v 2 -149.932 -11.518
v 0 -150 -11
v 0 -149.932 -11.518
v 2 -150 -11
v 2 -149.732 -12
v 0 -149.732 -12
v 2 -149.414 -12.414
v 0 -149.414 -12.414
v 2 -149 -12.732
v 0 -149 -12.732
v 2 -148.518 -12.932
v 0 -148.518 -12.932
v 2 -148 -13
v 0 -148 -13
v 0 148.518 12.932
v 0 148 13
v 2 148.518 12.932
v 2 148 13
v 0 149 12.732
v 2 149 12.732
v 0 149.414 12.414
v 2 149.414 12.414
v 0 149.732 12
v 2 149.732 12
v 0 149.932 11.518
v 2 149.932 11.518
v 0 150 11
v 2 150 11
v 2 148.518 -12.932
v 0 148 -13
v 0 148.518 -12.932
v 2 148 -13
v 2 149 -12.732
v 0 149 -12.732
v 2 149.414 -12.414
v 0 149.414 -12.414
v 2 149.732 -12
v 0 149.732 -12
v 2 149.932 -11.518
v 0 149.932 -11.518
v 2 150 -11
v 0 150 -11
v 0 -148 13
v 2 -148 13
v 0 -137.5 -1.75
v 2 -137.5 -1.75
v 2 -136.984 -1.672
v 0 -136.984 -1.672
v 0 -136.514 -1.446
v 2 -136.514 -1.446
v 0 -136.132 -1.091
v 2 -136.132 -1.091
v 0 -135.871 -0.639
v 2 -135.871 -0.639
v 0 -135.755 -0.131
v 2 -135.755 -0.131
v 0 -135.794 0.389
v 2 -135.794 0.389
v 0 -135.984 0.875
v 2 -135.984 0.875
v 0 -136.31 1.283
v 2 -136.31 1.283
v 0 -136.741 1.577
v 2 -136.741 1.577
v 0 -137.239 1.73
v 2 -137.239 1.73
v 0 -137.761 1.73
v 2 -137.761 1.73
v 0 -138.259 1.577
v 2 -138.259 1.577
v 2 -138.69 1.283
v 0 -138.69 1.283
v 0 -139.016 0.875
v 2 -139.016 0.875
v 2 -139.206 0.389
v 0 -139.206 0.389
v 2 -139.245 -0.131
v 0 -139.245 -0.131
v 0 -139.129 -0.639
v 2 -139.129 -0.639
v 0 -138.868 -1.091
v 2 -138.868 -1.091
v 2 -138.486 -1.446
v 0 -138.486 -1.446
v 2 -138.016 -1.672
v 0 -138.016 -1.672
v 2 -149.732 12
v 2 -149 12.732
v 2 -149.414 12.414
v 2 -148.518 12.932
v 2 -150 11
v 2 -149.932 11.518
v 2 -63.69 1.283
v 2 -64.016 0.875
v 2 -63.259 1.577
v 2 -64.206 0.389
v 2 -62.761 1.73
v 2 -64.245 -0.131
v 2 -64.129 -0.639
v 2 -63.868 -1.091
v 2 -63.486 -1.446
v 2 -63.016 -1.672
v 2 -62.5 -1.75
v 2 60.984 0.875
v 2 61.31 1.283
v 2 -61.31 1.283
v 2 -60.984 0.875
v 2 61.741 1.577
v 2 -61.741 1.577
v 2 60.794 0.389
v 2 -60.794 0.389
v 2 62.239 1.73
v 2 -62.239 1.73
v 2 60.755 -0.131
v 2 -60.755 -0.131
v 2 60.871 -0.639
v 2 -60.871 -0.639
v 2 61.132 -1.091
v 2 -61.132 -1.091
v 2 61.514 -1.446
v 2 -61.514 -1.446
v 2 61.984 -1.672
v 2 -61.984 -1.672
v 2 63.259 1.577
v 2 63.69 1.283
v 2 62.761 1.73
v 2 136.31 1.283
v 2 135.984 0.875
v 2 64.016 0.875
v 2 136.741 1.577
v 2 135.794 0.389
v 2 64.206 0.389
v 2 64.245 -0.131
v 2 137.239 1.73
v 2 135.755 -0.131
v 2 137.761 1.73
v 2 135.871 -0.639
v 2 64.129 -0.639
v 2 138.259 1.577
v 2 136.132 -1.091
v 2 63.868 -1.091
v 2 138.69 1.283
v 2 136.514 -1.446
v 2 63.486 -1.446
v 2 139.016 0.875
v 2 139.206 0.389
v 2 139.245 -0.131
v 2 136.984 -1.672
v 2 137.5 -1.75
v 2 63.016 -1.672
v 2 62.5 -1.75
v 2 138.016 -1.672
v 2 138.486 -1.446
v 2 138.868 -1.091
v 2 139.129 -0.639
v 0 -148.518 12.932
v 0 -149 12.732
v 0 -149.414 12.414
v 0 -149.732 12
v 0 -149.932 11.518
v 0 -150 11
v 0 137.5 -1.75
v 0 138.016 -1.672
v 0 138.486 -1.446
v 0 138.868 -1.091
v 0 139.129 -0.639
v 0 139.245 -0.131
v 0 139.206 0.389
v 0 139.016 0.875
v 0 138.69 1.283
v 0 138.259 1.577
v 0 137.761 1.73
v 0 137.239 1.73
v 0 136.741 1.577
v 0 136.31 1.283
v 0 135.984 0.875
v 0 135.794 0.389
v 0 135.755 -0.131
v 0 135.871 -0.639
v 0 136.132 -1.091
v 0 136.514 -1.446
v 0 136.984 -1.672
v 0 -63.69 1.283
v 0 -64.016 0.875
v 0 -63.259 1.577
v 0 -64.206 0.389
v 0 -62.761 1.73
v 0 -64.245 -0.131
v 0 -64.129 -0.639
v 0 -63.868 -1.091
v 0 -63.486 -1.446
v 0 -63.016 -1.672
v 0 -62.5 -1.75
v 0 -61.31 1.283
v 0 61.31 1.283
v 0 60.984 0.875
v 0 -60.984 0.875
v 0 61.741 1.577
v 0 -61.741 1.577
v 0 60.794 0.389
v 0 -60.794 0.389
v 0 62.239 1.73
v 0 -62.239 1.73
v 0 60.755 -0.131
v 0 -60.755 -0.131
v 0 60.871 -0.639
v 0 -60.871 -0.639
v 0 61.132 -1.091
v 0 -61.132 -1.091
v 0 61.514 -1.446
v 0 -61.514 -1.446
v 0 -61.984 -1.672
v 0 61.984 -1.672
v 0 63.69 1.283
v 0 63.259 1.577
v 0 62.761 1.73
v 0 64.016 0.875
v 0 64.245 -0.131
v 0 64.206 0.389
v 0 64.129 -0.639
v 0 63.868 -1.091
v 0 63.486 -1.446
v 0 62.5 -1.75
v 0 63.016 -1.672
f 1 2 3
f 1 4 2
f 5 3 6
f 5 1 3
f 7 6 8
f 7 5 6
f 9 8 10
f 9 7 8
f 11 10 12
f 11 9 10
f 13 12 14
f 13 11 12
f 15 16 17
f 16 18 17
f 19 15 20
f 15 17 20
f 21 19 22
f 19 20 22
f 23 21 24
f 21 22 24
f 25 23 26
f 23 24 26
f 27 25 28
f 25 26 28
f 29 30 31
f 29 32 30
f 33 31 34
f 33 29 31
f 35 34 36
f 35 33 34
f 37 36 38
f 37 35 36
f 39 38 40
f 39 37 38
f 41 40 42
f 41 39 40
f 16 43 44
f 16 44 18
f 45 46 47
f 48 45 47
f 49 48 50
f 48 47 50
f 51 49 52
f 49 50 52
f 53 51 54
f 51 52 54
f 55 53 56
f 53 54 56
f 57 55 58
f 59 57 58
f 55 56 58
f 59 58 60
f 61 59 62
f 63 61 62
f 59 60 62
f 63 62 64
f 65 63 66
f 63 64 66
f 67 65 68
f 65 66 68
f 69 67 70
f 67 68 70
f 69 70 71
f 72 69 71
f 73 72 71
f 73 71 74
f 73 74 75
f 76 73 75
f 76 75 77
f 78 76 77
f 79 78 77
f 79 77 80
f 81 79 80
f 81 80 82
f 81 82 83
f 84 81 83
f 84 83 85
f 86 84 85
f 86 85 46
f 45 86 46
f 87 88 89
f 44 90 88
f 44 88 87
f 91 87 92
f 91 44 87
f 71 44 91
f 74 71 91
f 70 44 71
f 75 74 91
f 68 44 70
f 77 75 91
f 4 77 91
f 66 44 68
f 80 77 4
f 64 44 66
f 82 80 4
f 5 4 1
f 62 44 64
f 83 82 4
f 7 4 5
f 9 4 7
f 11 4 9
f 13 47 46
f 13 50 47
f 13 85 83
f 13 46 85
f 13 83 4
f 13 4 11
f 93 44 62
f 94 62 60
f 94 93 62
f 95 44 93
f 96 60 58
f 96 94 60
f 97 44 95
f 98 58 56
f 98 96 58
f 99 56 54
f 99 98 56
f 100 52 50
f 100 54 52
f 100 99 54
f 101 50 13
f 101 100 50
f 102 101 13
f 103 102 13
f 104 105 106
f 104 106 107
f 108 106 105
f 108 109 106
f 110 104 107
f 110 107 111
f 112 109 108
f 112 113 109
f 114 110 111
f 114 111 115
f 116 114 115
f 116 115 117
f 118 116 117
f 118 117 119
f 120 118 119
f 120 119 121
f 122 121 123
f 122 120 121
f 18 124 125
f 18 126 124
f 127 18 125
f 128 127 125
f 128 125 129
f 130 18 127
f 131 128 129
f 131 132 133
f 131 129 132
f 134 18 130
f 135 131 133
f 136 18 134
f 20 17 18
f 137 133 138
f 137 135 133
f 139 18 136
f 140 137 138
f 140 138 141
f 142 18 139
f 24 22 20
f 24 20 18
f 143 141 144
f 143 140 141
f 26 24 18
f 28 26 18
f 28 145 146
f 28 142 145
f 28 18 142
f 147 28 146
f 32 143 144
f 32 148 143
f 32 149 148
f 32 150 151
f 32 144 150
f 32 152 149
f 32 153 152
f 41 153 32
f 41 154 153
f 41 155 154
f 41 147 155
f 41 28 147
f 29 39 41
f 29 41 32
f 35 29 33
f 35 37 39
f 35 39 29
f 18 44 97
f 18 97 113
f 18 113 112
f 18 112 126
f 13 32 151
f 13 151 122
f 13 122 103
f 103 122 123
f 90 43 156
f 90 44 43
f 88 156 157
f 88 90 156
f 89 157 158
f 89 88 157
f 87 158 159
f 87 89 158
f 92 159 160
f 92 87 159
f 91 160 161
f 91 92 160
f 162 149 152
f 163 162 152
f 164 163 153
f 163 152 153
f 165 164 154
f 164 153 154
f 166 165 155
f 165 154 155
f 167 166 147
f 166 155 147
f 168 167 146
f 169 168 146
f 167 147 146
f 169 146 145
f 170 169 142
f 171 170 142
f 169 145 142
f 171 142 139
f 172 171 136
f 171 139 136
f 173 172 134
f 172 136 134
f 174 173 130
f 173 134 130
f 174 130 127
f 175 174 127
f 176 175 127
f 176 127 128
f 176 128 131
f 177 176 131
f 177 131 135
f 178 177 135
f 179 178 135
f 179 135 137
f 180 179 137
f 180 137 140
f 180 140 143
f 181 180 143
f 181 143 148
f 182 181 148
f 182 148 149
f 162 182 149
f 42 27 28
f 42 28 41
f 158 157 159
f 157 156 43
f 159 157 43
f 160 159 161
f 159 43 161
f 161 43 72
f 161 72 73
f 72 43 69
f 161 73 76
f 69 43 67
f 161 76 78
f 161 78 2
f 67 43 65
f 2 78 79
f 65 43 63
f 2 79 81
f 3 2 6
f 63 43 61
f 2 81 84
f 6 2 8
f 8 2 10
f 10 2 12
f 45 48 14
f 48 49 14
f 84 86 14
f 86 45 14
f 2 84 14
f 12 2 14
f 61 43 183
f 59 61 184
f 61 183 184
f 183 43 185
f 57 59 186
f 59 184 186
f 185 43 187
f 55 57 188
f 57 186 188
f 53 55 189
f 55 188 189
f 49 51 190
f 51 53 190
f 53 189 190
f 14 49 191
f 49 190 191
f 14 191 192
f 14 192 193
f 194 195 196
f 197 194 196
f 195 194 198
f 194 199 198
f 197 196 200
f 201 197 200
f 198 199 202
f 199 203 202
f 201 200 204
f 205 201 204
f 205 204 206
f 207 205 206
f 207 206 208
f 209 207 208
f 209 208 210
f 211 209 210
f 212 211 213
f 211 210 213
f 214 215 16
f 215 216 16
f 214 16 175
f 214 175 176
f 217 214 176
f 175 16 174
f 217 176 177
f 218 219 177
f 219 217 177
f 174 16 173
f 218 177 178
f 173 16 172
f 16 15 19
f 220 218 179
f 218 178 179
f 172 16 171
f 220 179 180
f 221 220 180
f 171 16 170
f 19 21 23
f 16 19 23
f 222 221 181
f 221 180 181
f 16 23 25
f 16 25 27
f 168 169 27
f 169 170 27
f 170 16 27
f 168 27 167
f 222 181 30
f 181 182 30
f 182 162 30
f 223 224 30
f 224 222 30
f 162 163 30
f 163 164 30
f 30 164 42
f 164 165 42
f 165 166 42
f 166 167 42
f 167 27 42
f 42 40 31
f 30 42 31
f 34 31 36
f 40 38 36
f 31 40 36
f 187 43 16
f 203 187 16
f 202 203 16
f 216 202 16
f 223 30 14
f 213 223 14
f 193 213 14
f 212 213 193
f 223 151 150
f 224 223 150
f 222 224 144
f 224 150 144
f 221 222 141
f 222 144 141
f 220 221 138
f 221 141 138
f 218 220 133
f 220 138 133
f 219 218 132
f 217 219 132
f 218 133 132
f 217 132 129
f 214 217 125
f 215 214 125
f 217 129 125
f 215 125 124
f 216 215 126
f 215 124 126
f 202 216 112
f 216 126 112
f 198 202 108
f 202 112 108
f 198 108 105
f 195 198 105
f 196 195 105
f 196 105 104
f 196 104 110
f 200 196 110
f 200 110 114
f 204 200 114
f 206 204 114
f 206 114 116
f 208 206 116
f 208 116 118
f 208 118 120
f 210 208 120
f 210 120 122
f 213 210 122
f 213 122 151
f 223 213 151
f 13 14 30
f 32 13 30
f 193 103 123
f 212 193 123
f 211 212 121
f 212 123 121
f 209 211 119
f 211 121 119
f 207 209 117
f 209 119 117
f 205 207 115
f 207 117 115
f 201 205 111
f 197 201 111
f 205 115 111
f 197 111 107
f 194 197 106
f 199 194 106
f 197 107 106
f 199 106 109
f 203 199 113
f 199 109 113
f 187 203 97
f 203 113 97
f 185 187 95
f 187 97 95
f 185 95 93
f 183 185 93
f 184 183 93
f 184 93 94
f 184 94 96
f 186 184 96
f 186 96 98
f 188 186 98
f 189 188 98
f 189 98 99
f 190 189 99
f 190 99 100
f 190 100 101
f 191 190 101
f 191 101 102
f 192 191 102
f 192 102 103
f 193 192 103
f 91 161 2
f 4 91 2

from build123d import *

# Parameters (mm, degrees)
SKETCH1_W           = 26
SKETCH1_H           = 300
BOSS_EXTRUDE1_DEPTH = 2
FILLET1_R           = 2
SKETCH2_R           = 1.75
CUT_EXTRUDE1_DEPTH  = 151.575562426


with BuildPart() as part:
    # Sketch1 → Boss-Extrude1 (new body)
    with BuildSketch(Plane(origin=(0, 0, 0), x_dir=(0, 0, -1), z_dir=(1, 0, 0))):
        Rectangle(SKETCH1_W, SKETCH1_H)
    extrude(amount=BOSS_EXTRUDE1_DEPTH)

    # Fillet1
    fillet1_edges = [part.edges().sort_by_distance(p)[0] for p in [
        (1, -150, -13),
        (1, -150, 13),
        (1, 150, 13),
        (1, 150, -13),
    ]]
    fillet(fillet1_edges, radius=FILLET1_R)

    # Sketch2 → Cut-Extrude1 (cut, through all)
    with BuildSketch(Plane(origin=(2, 0, 0), x_dir=(0, 0, -1), z_dir=(1, 0, 0))):
        with Locations((0, -137.5)):
            Circle(SKETCH2_R)
        with Locations((0, -62.5)):
            Circle(SKETCH2_R)
        with Locations((0, 62.5)):
            Circle(SKETCH2_R)
        with Locations((0, 137.5)):
            Circle(SKETCH2_R)
    extrude(amount=-CUT_EXTRUDE1_DEPTH, mode=Mode.SUBTRACT)


solid = part.part
